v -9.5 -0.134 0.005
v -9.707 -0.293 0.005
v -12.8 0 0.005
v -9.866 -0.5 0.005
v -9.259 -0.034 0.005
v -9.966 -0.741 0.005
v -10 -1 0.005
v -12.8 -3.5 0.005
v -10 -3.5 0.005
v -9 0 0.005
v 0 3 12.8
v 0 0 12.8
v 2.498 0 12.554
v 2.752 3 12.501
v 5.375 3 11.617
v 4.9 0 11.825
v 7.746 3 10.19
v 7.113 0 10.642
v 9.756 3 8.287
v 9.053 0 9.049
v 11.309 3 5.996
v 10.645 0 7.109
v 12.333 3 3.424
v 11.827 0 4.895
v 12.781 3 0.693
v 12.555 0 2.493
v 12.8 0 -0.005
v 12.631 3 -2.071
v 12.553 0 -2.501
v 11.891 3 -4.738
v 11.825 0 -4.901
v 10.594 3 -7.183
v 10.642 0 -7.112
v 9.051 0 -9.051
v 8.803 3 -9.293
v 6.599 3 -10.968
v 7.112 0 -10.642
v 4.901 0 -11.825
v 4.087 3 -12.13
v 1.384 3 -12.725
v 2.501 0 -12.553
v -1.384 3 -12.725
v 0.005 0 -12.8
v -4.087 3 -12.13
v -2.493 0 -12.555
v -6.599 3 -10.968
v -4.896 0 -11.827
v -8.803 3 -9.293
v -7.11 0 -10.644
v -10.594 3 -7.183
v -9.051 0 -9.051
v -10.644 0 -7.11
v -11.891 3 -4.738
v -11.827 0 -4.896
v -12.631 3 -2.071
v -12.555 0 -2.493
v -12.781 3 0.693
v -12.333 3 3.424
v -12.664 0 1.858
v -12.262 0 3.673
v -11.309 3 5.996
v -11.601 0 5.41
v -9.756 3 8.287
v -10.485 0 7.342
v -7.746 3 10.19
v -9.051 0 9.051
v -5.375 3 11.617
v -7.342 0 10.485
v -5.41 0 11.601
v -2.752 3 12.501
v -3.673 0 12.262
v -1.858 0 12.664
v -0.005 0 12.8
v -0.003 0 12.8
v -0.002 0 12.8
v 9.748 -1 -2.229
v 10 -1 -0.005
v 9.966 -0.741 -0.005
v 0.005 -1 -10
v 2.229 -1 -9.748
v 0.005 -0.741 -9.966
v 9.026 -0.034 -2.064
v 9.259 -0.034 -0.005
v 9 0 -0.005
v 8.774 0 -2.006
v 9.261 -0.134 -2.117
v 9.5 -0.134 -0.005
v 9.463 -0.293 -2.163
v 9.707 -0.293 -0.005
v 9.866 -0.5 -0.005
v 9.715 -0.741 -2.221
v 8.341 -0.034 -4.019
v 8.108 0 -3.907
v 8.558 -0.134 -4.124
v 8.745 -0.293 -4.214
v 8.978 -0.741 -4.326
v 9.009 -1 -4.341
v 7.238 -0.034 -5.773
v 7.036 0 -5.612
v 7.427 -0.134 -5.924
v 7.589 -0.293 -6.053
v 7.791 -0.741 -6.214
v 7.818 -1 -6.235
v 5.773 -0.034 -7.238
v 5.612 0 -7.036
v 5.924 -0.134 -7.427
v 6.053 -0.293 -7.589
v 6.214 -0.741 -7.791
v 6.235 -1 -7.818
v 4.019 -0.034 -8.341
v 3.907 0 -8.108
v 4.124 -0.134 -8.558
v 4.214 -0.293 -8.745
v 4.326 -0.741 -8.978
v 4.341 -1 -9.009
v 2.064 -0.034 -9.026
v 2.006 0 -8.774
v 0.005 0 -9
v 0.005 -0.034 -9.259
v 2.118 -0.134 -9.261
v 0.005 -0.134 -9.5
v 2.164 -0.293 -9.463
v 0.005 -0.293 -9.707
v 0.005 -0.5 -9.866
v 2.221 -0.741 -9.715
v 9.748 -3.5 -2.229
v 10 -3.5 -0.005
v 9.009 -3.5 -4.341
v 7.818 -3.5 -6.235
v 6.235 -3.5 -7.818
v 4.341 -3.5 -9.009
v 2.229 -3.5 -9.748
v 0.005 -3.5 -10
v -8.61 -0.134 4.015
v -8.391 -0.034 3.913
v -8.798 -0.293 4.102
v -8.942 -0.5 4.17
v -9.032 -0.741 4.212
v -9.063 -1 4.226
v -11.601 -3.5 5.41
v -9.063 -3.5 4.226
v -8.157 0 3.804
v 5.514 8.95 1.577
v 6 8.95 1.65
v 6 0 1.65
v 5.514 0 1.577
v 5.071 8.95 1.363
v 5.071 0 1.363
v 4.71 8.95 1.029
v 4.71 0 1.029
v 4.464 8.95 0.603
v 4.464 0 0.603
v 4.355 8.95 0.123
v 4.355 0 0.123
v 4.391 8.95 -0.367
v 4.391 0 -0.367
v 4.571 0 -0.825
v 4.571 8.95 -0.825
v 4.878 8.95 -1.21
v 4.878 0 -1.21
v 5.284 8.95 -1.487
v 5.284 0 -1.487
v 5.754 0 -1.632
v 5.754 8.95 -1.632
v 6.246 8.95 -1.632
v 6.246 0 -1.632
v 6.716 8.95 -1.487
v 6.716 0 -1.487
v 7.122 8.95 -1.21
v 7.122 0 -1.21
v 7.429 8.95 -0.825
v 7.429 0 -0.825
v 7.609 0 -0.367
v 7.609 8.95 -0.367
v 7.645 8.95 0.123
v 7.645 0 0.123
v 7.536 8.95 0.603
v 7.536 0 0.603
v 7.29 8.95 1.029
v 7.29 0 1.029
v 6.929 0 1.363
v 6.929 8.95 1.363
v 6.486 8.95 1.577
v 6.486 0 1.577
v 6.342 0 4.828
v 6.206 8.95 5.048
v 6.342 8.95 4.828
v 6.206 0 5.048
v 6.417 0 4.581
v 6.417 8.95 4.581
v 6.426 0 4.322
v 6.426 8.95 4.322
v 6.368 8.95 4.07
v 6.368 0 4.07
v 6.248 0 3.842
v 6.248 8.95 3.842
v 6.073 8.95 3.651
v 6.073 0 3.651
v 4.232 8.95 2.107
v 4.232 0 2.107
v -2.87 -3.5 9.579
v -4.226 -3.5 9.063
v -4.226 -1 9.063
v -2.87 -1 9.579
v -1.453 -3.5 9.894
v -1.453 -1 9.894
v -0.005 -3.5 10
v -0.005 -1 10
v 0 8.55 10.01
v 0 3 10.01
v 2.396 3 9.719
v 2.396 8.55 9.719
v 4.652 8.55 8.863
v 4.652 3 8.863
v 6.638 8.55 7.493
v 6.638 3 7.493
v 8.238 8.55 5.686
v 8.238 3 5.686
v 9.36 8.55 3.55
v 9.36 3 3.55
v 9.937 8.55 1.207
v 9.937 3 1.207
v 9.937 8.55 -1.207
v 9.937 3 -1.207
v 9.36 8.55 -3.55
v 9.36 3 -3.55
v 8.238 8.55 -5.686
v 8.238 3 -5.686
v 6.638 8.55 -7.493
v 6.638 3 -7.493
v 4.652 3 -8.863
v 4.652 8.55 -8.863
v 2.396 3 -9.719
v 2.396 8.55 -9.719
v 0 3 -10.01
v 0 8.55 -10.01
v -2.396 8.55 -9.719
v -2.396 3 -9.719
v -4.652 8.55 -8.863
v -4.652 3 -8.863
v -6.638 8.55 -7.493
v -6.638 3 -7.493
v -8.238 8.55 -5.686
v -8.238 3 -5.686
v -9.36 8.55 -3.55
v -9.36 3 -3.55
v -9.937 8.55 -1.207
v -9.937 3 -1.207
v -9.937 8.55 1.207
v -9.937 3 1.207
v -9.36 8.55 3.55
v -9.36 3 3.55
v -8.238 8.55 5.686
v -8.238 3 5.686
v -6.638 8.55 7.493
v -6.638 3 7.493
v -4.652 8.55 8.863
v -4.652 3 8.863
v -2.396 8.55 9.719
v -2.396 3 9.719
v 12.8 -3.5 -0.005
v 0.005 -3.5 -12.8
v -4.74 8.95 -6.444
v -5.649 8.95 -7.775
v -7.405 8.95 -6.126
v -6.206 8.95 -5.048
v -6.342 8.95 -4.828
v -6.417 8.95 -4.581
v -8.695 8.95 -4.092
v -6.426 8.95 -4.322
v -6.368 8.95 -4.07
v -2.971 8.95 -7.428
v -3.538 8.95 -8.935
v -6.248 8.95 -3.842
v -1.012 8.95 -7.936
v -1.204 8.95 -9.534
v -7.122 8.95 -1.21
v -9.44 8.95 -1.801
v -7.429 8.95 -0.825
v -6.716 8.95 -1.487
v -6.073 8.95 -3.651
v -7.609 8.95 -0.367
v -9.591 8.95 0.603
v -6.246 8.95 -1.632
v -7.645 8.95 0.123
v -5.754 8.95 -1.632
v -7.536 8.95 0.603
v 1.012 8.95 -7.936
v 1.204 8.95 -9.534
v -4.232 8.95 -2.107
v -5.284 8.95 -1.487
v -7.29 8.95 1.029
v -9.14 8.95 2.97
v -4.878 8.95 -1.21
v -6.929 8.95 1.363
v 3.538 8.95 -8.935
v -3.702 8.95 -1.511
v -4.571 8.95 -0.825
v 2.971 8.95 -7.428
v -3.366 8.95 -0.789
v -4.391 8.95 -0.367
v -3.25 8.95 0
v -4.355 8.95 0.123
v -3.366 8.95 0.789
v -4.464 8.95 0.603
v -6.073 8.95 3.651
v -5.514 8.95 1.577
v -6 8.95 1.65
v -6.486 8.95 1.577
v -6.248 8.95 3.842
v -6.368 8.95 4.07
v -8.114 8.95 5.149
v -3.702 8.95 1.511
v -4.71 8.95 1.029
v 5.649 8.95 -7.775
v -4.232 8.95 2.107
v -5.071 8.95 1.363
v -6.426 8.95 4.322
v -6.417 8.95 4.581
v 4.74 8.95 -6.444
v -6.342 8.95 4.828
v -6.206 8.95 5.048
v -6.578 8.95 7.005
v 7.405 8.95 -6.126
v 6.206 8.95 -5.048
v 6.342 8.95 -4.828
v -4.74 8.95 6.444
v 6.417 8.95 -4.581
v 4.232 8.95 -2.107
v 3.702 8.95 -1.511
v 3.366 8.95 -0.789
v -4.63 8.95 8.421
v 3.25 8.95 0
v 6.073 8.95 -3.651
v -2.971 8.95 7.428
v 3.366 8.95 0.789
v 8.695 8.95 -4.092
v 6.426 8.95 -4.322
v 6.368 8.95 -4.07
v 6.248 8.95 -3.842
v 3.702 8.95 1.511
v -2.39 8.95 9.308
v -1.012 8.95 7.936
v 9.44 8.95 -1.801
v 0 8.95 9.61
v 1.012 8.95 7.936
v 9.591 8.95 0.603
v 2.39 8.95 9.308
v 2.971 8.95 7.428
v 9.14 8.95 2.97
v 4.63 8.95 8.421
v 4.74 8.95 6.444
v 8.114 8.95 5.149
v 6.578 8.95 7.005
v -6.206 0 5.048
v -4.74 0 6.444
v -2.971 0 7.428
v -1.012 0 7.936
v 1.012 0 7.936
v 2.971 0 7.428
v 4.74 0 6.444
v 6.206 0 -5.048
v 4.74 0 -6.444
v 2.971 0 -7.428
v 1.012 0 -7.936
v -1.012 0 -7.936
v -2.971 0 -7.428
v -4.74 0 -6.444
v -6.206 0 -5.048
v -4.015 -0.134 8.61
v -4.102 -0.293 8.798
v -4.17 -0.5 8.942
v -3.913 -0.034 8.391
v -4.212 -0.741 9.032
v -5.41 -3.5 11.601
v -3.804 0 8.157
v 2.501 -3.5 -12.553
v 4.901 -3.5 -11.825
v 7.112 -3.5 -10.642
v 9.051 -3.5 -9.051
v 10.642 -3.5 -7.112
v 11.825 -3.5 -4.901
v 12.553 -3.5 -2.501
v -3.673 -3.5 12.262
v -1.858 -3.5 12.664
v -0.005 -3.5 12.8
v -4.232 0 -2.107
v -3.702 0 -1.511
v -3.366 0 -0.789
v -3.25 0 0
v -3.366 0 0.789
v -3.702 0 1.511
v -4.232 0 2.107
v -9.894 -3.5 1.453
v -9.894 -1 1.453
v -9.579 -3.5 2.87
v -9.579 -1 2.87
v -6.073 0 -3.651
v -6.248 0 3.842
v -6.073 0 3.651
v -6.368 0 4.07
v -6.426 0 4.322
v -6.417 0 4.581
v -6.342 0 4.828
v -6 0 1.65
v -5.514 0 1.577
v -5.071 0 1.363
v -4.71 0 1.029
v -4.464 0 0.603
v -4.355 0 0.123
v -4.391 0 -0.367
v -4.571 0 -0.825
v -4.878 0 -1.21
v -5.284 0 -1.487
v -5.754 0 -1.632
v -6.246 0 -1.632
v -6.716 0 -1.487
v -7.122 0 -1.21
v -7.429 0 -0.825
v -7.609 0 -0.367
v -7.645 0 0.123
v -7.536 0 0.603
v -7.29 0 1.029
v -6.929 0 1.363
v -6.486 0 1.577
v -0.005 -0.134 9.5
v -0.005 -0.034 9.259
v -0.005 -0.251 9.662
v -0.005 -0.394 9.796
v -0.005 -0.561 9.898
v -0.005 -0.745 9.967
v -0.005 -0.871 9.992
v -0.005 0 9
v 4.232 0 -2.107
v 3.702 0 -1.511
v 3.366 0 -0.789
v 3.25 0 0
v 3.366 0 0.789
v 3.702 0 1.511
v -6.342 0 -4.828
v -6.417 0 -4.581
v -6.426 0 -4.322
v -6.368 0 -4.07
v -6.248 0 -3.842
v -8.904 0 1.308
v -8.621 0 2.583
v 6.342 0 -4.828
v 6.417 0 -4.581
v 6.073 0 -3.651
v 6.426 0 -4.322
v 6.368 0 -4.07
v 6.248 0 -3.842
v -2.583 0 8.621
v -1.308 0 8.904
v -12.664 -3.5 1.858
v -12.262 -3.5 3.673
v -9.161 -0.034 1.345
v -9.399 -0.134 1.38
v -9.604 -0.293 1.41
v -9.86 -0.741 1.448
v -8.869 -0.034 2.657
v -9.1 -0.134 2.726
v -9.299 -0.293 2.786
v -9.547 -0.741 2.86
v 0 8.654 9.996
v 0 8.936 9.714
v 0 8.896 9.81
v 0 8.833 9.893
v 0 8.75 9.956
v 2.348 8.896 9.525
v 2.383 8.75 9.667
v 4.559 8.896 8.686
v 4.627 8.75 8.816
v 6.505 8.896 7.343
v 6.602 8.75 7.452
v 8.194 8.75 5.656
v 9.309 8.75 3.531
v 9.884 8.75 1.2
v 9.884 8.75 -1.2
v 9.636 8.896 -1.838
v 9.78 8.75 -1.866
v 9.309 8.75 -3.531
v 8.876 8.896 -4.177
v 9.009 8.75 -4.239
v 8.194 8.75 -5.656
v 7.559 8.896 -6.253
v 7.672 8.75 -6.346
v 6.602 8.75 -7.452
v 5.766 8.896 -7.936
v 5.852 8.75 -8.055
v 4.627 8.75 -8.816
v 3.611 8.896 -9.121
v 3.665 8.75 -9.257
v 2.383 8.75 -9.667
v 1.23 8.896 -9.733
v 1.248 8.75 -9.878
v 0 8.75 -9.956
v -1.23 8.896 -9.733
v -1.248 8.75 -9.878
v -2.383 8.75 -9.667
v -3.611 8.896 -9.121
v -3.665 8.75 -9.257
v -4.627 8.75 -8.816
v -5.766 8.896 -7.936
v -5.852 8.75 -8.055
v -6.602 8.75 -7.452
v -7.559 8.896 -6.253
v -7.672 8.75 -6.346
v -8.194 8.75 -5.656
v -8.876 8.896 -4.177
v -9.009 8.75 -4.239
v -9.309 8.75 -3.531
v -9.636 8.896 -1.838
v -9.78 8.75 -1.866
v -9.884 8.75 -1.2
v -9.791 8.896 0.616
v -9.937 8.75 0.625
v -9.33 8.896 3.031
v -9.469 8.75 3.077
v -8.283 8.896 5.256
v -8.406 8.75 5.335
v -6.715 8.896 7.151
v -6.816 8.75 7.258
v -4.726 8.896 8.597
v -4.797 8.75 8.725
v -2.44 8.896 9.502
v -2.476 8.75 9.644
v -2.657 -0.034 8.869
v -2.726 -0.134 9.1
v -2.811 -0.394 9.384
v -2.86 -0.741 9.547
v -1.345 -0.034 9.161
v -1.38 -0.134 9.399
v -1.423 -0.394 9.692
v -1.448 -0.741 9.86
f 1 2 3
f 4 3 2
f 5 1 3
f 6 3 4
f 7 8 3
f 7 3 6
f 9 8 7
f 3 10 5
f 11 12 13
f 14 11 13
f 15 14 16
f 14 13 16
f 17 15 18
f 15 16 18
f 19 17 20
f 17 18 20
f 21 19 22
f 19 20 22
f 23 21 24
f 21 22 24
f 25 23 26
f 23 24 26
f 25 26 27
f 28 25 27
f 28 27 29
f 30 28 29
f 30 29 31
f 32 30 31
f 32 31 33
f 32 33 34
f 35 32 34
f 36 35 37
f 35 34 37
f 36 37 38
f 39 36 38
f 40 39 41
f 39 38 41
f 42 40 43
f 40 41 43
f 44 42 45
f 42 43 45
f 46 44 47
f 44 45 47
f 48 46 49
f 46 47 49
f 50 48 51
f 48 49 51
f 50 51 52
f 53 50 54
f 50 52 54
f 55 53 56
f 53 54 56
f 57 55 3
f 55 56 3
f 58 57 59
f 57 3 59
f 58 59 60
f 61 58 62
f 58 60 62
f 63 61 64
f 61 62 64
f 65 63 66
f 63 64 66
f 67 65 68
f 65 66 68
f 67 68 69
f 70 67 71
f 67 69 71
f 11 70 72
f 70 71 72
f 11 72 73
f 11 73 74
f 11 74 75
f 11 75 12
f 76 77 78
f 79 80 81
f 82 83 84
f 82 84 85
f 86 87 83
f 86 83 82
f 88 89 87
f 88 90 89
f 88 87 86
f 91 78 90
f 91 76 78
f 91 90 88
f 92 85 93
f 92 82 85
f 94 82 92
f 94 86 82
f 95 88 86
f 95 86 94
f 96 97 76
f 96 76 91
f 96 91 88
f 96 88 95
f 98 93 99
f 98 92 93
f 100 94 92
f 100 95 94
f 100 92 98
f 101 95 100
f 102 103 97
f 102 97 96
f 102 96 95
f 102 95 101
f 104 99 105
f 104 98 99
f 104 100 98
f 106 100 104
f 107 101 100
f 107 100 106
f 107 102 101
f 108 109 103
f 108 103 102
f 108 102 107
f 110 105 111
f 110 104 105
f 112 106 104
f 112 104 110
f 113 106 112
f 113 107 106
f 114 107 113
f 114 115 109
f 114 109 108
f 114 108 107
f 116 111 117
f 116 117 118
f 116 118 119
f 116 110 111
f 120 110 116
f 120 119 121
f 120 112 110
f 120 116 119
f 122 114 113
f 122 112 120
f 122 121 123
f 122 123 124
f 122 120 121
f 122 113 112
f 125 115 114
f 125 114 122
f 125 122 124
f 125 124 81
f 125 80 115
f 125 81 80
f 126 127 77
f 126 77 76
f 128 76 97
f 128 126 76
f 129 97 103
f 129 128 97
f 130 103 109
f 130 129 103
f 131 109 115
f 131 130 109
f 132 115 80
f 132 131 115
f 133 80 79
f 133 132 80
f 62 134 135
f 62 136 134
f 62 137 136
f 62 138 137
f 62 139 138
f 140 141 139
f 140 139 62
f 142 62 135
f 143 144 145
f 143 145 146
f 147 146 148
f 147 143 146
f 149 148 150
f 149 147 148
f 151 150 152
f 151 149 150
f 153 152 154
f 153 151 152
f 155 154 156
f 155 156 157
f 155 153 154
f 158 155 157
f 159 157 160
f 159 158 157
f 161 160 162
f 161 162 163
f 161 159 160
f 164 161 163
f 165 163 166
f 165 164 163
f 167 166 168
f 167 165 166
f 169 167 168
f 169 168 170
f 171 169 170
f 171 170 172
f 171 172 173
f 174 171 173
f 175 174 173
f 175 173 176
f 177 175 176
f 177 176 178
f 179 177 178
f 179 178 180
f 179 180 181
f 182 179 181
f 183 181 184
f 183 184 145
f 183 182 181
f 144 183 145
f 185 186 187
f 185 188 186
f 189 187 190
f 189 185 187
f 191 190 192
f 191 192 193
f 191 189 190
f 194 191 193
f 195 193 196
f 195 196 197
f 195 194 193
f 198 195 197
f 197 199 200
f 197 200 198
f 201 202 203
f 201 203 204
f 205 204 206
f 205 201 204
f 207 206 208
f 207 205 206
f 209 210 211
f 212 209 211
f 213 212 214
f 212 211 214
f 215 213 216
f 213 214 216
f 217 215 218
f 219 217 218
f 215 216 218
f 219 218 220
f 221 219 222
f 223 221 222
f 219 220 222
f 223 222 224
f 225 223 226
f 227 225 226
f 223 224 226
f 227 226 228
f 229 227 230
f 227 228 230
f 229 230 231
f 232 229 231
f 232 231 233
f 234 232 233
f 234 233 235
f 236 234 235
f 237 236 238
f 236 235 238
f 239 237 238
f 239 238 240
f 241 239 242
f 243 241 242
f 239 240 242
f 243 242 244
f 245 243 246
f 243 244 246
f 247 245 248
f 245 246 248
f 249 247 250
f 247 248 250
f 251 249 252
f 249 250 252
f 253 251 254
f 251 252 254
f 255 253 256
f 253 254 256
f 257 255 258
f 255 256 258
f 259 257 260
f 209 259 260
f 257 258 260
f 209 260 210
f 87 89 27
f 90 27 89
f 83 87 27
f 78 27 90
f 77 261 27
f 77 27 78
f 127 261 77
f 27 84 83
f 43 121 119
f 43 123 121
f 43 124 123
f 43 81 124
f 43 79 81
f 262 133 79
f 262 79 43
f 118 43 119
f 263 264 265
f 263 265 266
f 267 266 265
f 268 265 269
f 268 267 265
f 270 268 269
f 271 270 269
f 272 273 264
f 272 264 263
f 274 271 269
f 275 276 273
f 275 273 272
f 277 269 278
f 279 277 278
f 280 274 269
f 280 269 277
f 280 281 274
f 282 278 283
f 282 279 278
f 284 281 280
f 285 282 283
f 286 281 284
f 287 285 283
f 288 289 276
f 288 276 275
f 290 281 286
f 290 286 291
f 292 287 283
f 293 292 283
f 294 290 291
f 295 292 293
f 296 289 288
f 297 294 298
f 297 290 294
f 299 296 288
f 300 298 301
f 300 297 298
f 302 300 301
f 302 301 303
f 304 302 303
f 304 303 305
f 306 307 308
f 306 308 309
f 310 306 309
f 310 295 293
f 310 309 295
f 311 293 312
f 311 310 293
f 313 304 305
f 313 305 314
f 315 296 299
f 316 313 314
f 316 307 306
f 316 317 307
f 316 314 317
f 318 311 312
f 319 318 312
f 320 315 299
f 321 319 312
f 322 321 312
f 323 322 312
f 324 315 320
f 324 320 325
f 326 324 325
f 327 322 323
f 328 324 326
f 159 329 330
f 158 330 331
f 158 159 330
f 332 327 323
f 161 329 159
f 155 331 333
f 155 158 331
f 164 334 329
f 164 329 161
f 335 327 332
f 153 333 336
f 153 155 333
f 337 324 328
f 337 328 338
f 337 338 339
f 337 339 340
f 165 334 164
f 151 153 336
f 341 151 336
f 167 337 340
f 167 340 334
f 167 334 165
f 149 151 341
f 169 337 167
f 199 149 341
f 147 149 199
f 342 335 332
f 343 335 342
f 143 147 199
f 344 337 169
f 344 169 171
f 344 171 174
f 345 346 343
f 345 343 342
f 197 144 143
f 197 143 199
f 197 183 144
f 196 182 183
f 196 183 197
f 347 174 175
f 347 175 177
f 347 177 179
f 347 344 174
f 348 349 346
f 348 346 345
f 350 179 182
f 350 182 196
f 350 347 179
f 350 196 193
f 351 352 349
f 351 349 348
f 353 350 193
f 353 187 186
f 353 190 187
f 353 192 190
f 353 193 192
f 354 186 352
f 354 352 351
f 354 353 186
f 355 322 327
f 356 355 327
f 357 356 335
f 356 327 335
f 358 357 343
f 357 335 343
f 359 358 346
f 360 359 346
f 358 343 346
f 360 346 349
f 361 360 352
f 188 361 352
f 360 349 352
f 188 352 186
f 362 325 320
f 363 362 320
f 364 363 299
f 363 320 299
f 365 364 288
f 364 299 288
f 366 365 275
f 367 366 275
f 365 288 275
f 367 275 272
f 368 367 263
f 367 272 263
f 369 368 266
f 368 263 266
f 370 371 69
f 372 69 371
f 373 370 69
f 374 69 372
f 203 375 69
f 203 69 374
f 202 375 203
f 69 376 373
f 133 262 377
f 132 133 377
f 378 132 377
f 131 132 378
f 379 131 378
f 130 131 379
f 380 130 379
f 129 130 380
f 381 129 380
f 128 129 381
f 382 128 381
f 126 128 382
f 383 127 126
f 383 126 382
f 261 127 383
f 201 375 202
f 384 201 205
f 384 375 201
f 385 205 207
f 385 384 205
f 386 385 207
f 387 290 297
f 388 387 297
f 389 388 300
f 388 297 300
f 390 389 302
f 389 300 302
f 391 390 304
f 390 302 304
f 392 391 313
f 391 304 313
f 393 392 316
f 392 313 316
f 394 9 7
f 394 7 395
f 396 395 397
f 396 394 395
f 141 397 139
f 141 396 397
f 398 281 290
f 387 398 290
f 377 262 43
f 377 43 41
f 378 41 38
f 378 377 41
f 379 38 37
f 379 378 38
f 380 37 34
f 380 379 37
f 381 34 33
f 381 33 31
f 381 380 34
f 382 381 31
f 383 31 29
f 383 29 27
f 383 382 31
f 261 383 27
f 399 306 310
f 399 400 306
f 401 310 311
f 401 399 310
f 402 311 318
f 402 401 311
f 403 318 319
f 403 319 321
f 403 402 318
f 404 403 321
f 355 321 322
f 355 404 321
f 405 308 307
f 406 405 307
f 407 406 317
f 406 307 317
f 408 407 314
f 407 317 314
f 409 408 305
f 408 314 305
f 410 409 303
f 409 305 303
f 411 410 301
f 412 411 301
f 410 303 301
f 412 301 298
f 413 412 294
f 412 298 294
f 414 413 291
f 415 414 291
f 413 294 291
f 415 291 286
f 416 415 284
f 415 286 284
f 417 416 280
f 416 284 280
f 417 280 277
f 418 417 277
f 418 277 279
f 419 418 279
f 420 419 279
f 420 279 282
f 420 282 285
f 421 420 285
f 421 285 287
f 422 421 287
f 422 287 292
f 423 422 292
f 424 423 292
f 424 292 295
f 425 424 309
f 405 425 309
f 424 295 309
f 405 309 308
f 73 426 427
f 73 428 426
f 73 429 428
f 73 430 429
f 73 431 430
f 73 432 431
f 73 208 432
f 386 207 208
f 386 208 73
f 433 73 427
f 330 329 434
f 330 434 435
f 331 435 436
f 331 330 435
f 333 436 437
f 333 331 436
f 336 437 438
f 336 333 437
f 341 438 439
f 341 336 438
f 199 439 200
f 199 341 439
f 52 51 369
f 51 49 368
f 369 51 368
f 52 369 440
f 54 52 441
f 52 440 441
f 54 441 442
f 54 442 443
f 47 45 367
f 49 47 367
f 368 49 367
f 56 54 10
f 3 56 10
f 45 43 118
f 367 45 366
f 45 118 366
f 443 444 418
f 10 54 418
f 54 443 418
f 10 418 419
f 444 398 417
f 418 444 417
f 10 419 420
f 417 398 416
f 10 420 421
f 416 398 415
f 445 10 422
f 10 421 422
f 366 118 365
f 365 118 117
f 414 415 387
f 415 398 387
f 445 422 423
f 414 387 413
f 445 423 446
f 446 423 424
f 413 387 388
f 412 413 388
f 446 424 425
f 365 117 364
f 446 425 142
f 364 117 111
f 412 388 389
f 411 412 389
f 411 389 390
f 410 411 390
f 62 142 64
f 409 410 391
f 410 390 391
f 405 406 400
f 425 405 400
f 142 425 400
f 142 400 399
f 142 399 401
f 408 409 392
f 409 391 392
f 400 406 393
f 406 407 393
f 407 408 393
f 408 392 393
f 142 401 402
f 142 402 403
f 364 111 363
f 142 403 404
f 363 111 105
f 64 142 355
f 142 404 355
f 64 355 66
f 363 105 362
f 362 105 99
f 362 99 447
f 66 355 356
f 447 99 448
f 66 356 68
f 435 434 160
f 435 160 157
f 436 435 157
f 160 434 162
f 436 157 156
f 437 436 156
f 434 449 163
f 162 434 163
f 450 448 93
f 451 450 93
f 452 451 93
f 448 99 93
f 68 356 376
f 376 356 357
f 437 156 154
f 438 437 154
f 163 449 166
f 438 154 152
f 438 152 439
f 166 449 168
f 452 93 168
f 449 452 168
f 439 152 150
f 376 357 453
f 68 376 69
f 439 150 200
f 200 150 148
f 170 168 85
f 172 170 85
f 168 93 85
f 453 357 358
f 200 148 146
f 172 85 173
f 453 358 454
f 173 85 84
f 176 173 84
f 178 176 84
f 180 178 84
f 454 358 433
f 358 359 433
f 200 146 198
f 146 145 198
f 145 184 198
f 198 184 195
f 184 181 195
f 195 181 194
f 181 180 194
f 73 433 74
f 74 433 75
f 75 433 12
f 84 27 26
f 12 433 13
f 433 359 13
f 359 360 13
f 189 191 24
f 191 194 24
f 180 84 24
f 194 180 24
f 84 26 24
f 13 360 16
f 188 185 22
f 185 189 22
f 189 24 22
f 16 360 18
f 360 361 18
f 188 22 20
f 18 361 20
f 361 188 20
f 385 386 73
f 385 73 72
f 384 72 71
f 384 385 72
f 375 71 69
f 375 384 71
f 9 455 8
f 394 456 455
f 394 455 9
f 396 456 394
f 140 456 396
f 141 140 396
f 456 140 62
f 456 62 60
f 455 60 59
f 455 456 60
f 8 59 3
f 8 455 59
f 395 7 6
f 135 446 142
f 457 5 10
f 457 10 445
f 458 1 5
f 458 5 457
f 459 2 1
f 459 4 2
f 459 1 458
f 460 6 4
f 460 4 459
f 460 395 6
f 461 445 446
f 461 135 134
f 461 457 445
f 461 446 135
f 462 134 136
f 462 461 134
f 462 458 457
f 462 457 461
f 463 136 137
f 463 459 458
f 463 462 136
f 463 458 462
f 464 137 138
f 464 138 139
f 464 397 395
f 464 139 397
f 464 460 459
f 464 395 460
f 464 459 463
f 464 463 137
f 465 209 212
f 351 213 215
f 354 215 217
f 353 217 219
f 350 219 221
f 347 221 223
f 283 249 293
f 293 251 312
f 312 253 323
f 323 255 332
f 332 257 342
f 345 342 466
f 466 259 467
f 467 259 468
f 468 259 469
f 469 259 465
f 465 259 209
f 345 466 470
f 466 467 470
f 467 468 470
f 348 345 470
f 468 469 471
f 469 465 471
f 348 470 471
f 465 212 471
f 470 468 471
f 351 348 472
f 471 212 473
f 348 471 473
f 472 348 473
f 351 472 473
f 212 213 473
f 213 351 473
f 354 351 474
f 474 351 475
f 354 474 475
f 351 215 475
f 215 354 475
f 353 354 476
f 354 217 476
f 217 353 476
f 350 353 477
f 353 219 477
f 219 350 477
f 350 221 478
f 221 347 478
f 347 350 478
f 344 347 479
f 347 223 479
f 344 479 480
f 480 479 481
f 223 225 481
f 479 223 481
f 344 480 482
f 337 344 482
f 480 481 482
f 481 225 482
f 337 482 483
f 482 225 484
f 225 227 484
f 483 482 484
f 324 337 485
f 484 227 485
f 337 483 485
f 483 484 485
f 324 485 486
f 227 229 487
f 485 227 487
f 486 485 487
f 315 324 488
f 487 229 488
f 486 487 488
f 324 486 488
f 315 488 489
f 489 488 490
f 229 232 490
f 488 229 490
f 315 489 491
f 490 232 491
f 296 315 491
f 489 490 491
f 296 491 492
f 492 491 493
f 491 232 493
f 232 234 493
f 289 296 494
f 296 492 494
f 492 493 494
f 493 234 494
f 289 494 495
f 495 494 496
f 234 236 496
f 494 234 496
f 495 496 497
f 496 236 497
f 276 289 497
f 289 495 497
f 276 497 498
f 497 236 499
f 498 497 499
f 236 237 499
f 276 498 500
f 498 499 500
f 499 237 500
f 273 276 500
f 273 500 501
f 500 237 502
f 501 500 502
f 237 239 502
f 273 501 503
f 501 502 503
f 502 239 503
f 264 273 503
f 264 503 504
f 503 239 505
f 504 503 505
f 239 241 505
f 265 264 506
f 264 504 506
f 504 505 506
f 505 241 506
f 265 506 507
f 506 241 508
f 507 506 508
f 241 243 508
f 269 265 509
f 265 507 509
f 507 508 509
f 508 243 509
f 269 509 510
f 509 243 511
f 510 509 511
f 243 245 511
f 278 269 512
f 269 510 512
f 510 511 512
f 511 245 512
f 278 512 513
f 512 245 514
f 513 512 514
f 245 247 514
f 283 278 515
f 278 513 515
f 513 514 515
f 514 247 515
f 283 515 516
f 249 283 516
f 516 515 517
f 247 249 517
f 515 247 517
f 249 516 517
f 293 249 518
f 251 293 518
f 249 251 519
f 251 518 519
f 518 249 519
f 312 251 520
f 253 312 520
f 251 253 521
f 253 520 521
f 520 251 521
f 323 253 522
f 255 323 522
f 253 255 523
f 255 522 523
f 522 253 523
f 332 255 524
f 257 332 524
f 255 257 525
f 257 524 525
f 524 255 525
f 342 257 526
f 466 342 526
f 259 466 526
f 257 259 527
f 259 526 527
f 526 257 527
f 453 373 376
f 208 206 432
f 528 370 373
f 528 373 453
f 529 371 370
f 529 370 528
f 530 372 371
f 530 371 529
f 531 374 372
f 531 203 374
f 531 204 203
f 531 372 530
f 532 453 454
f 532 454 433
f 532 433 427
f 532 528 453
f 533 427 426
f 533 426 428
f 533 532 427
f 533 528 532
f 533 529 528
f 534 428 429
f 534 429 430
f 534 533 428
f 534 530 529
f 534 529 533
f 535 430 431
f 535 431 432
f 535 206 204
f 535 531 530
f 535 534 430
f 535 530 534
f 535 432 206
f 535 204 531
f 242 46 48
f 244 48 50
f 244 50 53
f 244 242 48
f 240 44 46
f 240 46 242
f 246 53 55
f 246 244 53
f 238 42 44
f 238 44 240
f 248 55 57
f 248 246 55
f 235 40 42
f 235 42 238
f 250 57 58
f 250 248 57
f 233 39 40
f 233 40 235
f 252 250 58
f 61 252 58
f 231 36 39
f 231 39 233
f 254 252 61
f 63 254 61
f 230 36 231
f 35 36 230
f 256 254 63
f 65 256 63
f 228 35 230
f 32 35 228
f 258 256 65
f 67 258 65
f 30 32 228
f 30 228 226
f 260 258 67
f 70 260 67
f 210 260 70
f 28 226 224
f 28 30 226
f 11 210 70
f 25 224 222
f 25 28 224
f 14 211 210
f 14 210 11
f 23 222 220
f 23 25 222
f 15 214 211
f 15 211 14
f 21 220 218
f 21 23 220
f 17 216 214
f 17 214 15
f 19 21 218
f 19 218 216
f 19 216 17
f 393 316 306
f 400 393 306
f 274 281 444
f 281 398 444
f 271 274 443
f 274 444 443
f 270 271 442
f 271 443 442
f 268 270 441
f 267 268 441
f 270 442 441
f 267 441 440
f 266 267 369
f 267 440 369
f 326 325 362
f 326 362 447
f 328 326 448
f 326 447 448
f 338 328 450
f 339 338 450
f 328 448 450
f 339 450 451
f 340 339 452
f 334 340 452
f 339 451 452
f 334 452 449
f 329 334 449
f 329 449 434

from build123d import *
from build123d.topology import SkipClean

# Parameters (mm, degrees)
SKETCH_1_R             = 12.8
EXTRUDE_1_DEPTH        = 3
SKETCH_2_R             = 10.01
EXTRUDE_2_DEPTH        = 5.95
SKETCH_3_R             = 8
CUT_EXTRUDE_1_DEPTH    = 21.193625232
EXTRUDE_START          = 8.95
SKETCH_4_R             = 1.65
EXTRUDE_3_DEPTH        = 8.95
FILLET_1_R             = 1
FILLET_1_OF_MIRROR_1_R = 1
FILLET_2_R             = 0.4
EXTRUDE_START_2        = 3.5
EXTRUDE_4_DEPTH        = 3.5
FILLET_3_R             = 1


with BuildPart() as part:
    # 草图1 → 凸台-拉伸1 (new body)
    with BuildSketch(Plane(origin=(0, 0, 0), x_dir=(1, 0, 0), z_dir=(0, 1, 0))):
        with Locations(Location((0, 0, 0), (0, 0, 270))):
            Circle(SKETCH_1_R)
    extrude(amount=EXTRUDE_1_DEPTH)

    # 草图2 → 凸台-拉伸2 (add)
    with BuildSketch(Plane(origin=(0, 3, 0), x_dir=(1, 0, 0), z_dir=(0, 1, 0))):
        with Locations(Location((0, 0, 0), (0, 0, 270))):
            Circle(SKETCH_2_R)
    extrude(amount=EXTRUDE_2_DEPTH)

    # 草图3 → 切除-拉伸1 (cut, through all)
    with BuildSketch(Plane(origin=(0, 8.95, 0), x_dir=(1, 0, 0), z_dir=(0, 1, 0))):
        with Locations(Location((0, 0, 0), (0, 0, 270))):
            Circle(SKETCH_3_R)
    extrude(amount=-CUT_EXTRUDE_1_DEPTH, mode=Mode.SUBTRACT)

    # 草图4 → 凸台-拉伸3 (add)
    with BuildSketch(Plane(origin=(0, 0, 0), x_dir=(1, 0, 0), z_dir=(0, 1, 0)).offset(EXTRUDE_START)):
        with BuildLine():
            Line((-6.780819092, 4.245055058), (-4.232334073, 2.106622219))
            ThreePointArc((-4.232334073, 2.106622219), (-3.25, 0), (-4.232334073, -2.106622219))
            Line((-4.232334073, -2.106622219), (-6.780819092, -4.245055058))
            ThreePointArc((-6.780819092, -4.245055058), (-8, 0), (-6.780819092, 4.245055058))
        make_face()
        with Locations(Location((-6, 0, 0), (0, 0, 270))):
            Circle(SKETCH_4_R, mode=Mode.SUBTRACT)
    extrude_3 = extrude(amount=-EXTRUDE_3_DEPTH)

    # 圆角1
    fillet_1_edges = [part.edges().sort_by_distance(p)[0] for p in [
        (-6.780819092, 4.475, 4.245055058),
        (-6.780819092, 4.475, -4.245055058),
    ]]
    fillet(fillet_1_edges, radius=FILLET_1_R)

    # 镜向1: 凸台-拉伸3 across plane
    add(extrude_3.mirror(Plane(origin=(0, 0, 0), x_dir=(0, 0, 1), z_dir=(1, 0, 0))))

    # 圆角1 of 镜向1
    fillet_1_of_mirror_1_edges = [part.edges().sort_by_distance(p)[0] for p in [
        (6.780819092, 4.475, 4.245055058),
        (6.780819092, 4.475, -4.245055058),
    ]]
    fillet(fillet_1_of_mirror_1_edges, radius=FILLET_1_OF_MIRROR_1_R)

    # 圆角2
    fillet_2_edges = [part.edges().sort_by_distance(p)[0] for p in [
        (0, 8.95, -10.01),
    ]]
    fillet(fillet_2_edges, radius=FILLET_2_R)

    # 草图5 → 凸台-拉伸4 (add)
    with SkipClean():  # the faces are left unmerged after this step: merging them gives an invalid solid
        with BuildSketch(Plane.XZ.offset(EXTRUDE_START_2)):
            with BuildLine():
                ThreePointArc((0.005, -12.799999023), (9.050966799, -9.050966799), (12.799999023, -0.005))
                Line((12.799999023, -0.005), (9.99999875, -0.005))
                ThreePointArc((9.99999875, -0.005), (7.071067812, -7.071067812), (0.005, -9.99999875))
                Line((0.005, -9.99999875), (0.005, -12.799999023))
            make_face()
            with BuildLine():
                Line((-9.06307787, 4.226182617), (-11.600739674, 5.40951375))
                ThreePointArc((-11.600739674, 5.40951375), (-12.496047554, 2.772867746), (-12.799999023, 0.005))
                Line((-12.799999023, 0.005), (-9.99999875, 0.005))
                ThreePointArc((-9.99999875, 0.005), (-9.762418667, 2.166836812), (-9.06307787, 4.226182617))
            make_face()
            with BuildLine():
                Line((-0.005, 9.99999875), (-0.005, 12.799999023))
                ThreePointArc((-0.005, 12.799999023), (-2.772867746, 12.496047554), (-5.40951375, 11.600739674))
                Line((-5.40951375, 11.600739674), (-4.226182617, 9.06307787))
                ThreePointArc((-4.226182617, 9.06307787), (-2.166836812, 9.762418667), (-0.005, 9.99999875))
            make_face()
        extrude(amount=-EXTRUDE_4_DEPTH)

    # 圆角3
    fillet_3_edges = [part.edges().sort_by_distance(p)[0] for p in [
        (-2.166836812, 0, 9.762418667),
        (7.071067812, 0, -7.071067812),
        (-9.762418667, 0, 2.166836812),
    ]]
    fillet(fillet_3_edges, radius=FILLET_3_R)


solid = part.part
